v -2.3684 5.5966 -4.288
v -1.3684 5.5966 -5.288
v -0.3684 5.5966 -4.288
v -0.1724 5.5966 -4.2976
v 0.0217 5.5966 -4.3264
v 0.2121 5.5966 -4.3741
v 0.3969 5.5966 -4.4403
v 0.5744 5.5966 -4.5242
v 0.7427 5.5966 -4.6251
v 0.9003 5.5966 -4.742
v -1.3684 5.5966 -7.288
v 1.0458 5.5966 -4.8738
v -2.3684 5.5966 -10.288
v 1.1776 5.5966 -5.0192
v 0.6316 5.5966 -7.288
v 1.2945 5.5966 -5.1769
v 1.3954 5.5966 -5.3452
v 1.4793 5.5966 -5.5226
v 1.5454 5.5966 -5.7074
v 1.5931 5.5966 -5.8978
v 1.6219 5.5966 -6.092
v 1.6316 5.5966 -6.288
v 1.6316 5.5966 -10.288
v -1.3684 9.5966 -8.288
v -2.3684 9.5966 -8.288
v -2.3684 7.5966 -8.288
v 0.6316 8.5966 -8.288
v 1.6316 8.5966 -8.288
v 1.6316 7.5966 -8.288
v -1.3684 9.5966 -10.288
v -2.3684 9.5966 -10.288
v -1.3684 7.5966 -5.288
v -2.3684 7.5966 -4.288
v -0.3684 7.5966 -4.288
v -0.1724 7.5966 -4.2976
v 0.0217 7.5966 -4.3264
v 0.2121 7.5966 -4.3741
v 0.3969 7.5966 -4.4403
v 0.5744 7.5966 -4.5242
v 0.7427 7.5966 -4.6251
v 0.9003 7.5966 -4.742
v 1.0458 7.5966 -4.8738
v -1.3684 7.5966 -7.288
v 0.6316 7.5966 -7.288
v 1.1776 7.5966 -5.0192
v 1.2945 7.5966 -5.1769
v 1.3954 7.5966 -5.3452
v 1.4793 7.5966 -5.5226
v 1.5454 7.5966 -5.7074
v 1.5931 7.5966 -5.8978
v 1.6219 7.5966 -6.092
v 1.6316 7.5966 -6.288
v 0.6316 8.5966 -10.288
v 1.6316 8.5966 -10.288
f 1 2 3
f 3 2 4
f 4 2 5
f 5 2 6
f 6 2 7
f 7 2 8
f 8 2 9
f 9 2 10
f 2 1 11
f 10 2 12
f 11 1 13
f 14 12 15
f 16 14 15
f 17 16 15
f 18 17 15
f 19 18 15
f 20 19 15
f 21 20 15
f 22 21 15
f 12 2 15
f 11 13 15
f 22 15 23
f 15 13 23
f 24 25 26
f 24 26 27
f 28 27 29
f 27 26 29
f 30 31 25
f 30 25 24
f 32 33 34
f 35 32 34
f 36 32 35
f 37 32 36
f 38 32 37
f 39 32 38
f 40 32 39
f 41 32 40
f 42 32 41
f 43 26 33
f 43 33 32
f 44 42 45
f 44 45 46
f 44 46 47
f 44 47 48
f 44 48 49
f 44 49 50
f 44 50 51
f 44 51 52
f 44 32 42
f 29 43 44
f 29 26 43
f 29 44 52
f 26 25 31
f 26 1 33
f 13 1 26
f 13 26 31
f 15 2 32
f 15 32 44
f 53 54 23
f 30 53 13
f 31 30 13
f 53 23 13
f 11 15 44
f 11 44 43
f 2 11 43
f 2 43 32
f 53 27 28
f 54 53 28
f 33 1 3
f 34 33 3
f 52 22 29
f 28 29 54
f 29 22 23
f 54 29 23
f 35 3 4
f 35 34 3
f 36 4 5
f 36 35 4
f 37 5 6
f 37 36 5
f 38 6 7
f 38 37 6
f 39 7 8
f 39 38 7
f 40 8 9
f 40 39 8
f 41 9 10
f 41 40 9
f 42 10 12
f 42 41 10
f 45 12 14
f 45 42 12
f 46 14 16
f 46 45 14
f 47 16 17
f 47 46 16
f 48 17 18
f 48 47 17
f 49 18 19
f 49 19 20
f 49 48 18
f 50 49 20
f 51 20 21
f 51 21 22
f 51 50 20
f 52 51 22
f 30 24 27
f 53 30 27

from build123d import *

# Parameters (mm, degrees)
EXTRUDE_1_DEPTH     = 10
SKETCH_1_3_W        = 20
SKETCH_1_3_H        = 10
EXTRUDE_2_DEPTH     = 20
CUT_EXTRUDE_1_DEPTH = 20
FILLET_1_R          = 10
SCALE_1_SCALE       = 0.2


with BuildPart() as part:
    # 草圖1 → 填料-伸長1 (new body)
    with BuildSketch(Plane(origin=(0, 0, 0), x_dir=(1, 0, 0), z_dir=(0, 1, 0))):
        Polygon((-5, 10), (-10, 10), (-10, -10), (10, -10), (10, 10), (5, 10), align=None)
        Polygon((-5, 5), (5, 5), (-5, -5), align=None, mode=Mode.SUBTRACT)
    extrude(amount=EXTRUDE_1_DEPTH)

    # 草圖1<3> → 填料-伸長2 (add)
    with BuildSketch(Plane(origin=(0, 0, 0), x_dir=(1, 0, 0), z_dir=(0, 1, 0))):
        with Locations((0, 15)):
            Rectangle(SKETCH_1_3_W, SKETCH_1_3_H)
    extrude(amount=EXTRUDE_2_DEPTH)

    # 草圖2 → 除料-伸長1 (cut)
    with BuildSketch(Plane.XY.offset(-10)):
        Polygon((-5, 20), (5, 15), (10, 15), (10, 20), align=None)
    extrude(amount=-CUT_EXTRUDE_1_DEPTH, mode=Mode.SUBTRACT)

    # 圓角1
    fillet_1_edges = [part.edges().sort_by_distance(p)[0] for p in [
        (10, 5, 10),
    ]]
    fillet(fillet_1_edges, radius=FILLET_1_R)


with BuildPart() as part_1:
    # 縮放比例1: scaled about (-0.460547771, 6.995707008, -7.860015293)
    add(part.part.scale(SCALE_1_SCALE).moved(Location((-0.368438217, 5.596565606, -6.288012234))))


solid = part_1.part
